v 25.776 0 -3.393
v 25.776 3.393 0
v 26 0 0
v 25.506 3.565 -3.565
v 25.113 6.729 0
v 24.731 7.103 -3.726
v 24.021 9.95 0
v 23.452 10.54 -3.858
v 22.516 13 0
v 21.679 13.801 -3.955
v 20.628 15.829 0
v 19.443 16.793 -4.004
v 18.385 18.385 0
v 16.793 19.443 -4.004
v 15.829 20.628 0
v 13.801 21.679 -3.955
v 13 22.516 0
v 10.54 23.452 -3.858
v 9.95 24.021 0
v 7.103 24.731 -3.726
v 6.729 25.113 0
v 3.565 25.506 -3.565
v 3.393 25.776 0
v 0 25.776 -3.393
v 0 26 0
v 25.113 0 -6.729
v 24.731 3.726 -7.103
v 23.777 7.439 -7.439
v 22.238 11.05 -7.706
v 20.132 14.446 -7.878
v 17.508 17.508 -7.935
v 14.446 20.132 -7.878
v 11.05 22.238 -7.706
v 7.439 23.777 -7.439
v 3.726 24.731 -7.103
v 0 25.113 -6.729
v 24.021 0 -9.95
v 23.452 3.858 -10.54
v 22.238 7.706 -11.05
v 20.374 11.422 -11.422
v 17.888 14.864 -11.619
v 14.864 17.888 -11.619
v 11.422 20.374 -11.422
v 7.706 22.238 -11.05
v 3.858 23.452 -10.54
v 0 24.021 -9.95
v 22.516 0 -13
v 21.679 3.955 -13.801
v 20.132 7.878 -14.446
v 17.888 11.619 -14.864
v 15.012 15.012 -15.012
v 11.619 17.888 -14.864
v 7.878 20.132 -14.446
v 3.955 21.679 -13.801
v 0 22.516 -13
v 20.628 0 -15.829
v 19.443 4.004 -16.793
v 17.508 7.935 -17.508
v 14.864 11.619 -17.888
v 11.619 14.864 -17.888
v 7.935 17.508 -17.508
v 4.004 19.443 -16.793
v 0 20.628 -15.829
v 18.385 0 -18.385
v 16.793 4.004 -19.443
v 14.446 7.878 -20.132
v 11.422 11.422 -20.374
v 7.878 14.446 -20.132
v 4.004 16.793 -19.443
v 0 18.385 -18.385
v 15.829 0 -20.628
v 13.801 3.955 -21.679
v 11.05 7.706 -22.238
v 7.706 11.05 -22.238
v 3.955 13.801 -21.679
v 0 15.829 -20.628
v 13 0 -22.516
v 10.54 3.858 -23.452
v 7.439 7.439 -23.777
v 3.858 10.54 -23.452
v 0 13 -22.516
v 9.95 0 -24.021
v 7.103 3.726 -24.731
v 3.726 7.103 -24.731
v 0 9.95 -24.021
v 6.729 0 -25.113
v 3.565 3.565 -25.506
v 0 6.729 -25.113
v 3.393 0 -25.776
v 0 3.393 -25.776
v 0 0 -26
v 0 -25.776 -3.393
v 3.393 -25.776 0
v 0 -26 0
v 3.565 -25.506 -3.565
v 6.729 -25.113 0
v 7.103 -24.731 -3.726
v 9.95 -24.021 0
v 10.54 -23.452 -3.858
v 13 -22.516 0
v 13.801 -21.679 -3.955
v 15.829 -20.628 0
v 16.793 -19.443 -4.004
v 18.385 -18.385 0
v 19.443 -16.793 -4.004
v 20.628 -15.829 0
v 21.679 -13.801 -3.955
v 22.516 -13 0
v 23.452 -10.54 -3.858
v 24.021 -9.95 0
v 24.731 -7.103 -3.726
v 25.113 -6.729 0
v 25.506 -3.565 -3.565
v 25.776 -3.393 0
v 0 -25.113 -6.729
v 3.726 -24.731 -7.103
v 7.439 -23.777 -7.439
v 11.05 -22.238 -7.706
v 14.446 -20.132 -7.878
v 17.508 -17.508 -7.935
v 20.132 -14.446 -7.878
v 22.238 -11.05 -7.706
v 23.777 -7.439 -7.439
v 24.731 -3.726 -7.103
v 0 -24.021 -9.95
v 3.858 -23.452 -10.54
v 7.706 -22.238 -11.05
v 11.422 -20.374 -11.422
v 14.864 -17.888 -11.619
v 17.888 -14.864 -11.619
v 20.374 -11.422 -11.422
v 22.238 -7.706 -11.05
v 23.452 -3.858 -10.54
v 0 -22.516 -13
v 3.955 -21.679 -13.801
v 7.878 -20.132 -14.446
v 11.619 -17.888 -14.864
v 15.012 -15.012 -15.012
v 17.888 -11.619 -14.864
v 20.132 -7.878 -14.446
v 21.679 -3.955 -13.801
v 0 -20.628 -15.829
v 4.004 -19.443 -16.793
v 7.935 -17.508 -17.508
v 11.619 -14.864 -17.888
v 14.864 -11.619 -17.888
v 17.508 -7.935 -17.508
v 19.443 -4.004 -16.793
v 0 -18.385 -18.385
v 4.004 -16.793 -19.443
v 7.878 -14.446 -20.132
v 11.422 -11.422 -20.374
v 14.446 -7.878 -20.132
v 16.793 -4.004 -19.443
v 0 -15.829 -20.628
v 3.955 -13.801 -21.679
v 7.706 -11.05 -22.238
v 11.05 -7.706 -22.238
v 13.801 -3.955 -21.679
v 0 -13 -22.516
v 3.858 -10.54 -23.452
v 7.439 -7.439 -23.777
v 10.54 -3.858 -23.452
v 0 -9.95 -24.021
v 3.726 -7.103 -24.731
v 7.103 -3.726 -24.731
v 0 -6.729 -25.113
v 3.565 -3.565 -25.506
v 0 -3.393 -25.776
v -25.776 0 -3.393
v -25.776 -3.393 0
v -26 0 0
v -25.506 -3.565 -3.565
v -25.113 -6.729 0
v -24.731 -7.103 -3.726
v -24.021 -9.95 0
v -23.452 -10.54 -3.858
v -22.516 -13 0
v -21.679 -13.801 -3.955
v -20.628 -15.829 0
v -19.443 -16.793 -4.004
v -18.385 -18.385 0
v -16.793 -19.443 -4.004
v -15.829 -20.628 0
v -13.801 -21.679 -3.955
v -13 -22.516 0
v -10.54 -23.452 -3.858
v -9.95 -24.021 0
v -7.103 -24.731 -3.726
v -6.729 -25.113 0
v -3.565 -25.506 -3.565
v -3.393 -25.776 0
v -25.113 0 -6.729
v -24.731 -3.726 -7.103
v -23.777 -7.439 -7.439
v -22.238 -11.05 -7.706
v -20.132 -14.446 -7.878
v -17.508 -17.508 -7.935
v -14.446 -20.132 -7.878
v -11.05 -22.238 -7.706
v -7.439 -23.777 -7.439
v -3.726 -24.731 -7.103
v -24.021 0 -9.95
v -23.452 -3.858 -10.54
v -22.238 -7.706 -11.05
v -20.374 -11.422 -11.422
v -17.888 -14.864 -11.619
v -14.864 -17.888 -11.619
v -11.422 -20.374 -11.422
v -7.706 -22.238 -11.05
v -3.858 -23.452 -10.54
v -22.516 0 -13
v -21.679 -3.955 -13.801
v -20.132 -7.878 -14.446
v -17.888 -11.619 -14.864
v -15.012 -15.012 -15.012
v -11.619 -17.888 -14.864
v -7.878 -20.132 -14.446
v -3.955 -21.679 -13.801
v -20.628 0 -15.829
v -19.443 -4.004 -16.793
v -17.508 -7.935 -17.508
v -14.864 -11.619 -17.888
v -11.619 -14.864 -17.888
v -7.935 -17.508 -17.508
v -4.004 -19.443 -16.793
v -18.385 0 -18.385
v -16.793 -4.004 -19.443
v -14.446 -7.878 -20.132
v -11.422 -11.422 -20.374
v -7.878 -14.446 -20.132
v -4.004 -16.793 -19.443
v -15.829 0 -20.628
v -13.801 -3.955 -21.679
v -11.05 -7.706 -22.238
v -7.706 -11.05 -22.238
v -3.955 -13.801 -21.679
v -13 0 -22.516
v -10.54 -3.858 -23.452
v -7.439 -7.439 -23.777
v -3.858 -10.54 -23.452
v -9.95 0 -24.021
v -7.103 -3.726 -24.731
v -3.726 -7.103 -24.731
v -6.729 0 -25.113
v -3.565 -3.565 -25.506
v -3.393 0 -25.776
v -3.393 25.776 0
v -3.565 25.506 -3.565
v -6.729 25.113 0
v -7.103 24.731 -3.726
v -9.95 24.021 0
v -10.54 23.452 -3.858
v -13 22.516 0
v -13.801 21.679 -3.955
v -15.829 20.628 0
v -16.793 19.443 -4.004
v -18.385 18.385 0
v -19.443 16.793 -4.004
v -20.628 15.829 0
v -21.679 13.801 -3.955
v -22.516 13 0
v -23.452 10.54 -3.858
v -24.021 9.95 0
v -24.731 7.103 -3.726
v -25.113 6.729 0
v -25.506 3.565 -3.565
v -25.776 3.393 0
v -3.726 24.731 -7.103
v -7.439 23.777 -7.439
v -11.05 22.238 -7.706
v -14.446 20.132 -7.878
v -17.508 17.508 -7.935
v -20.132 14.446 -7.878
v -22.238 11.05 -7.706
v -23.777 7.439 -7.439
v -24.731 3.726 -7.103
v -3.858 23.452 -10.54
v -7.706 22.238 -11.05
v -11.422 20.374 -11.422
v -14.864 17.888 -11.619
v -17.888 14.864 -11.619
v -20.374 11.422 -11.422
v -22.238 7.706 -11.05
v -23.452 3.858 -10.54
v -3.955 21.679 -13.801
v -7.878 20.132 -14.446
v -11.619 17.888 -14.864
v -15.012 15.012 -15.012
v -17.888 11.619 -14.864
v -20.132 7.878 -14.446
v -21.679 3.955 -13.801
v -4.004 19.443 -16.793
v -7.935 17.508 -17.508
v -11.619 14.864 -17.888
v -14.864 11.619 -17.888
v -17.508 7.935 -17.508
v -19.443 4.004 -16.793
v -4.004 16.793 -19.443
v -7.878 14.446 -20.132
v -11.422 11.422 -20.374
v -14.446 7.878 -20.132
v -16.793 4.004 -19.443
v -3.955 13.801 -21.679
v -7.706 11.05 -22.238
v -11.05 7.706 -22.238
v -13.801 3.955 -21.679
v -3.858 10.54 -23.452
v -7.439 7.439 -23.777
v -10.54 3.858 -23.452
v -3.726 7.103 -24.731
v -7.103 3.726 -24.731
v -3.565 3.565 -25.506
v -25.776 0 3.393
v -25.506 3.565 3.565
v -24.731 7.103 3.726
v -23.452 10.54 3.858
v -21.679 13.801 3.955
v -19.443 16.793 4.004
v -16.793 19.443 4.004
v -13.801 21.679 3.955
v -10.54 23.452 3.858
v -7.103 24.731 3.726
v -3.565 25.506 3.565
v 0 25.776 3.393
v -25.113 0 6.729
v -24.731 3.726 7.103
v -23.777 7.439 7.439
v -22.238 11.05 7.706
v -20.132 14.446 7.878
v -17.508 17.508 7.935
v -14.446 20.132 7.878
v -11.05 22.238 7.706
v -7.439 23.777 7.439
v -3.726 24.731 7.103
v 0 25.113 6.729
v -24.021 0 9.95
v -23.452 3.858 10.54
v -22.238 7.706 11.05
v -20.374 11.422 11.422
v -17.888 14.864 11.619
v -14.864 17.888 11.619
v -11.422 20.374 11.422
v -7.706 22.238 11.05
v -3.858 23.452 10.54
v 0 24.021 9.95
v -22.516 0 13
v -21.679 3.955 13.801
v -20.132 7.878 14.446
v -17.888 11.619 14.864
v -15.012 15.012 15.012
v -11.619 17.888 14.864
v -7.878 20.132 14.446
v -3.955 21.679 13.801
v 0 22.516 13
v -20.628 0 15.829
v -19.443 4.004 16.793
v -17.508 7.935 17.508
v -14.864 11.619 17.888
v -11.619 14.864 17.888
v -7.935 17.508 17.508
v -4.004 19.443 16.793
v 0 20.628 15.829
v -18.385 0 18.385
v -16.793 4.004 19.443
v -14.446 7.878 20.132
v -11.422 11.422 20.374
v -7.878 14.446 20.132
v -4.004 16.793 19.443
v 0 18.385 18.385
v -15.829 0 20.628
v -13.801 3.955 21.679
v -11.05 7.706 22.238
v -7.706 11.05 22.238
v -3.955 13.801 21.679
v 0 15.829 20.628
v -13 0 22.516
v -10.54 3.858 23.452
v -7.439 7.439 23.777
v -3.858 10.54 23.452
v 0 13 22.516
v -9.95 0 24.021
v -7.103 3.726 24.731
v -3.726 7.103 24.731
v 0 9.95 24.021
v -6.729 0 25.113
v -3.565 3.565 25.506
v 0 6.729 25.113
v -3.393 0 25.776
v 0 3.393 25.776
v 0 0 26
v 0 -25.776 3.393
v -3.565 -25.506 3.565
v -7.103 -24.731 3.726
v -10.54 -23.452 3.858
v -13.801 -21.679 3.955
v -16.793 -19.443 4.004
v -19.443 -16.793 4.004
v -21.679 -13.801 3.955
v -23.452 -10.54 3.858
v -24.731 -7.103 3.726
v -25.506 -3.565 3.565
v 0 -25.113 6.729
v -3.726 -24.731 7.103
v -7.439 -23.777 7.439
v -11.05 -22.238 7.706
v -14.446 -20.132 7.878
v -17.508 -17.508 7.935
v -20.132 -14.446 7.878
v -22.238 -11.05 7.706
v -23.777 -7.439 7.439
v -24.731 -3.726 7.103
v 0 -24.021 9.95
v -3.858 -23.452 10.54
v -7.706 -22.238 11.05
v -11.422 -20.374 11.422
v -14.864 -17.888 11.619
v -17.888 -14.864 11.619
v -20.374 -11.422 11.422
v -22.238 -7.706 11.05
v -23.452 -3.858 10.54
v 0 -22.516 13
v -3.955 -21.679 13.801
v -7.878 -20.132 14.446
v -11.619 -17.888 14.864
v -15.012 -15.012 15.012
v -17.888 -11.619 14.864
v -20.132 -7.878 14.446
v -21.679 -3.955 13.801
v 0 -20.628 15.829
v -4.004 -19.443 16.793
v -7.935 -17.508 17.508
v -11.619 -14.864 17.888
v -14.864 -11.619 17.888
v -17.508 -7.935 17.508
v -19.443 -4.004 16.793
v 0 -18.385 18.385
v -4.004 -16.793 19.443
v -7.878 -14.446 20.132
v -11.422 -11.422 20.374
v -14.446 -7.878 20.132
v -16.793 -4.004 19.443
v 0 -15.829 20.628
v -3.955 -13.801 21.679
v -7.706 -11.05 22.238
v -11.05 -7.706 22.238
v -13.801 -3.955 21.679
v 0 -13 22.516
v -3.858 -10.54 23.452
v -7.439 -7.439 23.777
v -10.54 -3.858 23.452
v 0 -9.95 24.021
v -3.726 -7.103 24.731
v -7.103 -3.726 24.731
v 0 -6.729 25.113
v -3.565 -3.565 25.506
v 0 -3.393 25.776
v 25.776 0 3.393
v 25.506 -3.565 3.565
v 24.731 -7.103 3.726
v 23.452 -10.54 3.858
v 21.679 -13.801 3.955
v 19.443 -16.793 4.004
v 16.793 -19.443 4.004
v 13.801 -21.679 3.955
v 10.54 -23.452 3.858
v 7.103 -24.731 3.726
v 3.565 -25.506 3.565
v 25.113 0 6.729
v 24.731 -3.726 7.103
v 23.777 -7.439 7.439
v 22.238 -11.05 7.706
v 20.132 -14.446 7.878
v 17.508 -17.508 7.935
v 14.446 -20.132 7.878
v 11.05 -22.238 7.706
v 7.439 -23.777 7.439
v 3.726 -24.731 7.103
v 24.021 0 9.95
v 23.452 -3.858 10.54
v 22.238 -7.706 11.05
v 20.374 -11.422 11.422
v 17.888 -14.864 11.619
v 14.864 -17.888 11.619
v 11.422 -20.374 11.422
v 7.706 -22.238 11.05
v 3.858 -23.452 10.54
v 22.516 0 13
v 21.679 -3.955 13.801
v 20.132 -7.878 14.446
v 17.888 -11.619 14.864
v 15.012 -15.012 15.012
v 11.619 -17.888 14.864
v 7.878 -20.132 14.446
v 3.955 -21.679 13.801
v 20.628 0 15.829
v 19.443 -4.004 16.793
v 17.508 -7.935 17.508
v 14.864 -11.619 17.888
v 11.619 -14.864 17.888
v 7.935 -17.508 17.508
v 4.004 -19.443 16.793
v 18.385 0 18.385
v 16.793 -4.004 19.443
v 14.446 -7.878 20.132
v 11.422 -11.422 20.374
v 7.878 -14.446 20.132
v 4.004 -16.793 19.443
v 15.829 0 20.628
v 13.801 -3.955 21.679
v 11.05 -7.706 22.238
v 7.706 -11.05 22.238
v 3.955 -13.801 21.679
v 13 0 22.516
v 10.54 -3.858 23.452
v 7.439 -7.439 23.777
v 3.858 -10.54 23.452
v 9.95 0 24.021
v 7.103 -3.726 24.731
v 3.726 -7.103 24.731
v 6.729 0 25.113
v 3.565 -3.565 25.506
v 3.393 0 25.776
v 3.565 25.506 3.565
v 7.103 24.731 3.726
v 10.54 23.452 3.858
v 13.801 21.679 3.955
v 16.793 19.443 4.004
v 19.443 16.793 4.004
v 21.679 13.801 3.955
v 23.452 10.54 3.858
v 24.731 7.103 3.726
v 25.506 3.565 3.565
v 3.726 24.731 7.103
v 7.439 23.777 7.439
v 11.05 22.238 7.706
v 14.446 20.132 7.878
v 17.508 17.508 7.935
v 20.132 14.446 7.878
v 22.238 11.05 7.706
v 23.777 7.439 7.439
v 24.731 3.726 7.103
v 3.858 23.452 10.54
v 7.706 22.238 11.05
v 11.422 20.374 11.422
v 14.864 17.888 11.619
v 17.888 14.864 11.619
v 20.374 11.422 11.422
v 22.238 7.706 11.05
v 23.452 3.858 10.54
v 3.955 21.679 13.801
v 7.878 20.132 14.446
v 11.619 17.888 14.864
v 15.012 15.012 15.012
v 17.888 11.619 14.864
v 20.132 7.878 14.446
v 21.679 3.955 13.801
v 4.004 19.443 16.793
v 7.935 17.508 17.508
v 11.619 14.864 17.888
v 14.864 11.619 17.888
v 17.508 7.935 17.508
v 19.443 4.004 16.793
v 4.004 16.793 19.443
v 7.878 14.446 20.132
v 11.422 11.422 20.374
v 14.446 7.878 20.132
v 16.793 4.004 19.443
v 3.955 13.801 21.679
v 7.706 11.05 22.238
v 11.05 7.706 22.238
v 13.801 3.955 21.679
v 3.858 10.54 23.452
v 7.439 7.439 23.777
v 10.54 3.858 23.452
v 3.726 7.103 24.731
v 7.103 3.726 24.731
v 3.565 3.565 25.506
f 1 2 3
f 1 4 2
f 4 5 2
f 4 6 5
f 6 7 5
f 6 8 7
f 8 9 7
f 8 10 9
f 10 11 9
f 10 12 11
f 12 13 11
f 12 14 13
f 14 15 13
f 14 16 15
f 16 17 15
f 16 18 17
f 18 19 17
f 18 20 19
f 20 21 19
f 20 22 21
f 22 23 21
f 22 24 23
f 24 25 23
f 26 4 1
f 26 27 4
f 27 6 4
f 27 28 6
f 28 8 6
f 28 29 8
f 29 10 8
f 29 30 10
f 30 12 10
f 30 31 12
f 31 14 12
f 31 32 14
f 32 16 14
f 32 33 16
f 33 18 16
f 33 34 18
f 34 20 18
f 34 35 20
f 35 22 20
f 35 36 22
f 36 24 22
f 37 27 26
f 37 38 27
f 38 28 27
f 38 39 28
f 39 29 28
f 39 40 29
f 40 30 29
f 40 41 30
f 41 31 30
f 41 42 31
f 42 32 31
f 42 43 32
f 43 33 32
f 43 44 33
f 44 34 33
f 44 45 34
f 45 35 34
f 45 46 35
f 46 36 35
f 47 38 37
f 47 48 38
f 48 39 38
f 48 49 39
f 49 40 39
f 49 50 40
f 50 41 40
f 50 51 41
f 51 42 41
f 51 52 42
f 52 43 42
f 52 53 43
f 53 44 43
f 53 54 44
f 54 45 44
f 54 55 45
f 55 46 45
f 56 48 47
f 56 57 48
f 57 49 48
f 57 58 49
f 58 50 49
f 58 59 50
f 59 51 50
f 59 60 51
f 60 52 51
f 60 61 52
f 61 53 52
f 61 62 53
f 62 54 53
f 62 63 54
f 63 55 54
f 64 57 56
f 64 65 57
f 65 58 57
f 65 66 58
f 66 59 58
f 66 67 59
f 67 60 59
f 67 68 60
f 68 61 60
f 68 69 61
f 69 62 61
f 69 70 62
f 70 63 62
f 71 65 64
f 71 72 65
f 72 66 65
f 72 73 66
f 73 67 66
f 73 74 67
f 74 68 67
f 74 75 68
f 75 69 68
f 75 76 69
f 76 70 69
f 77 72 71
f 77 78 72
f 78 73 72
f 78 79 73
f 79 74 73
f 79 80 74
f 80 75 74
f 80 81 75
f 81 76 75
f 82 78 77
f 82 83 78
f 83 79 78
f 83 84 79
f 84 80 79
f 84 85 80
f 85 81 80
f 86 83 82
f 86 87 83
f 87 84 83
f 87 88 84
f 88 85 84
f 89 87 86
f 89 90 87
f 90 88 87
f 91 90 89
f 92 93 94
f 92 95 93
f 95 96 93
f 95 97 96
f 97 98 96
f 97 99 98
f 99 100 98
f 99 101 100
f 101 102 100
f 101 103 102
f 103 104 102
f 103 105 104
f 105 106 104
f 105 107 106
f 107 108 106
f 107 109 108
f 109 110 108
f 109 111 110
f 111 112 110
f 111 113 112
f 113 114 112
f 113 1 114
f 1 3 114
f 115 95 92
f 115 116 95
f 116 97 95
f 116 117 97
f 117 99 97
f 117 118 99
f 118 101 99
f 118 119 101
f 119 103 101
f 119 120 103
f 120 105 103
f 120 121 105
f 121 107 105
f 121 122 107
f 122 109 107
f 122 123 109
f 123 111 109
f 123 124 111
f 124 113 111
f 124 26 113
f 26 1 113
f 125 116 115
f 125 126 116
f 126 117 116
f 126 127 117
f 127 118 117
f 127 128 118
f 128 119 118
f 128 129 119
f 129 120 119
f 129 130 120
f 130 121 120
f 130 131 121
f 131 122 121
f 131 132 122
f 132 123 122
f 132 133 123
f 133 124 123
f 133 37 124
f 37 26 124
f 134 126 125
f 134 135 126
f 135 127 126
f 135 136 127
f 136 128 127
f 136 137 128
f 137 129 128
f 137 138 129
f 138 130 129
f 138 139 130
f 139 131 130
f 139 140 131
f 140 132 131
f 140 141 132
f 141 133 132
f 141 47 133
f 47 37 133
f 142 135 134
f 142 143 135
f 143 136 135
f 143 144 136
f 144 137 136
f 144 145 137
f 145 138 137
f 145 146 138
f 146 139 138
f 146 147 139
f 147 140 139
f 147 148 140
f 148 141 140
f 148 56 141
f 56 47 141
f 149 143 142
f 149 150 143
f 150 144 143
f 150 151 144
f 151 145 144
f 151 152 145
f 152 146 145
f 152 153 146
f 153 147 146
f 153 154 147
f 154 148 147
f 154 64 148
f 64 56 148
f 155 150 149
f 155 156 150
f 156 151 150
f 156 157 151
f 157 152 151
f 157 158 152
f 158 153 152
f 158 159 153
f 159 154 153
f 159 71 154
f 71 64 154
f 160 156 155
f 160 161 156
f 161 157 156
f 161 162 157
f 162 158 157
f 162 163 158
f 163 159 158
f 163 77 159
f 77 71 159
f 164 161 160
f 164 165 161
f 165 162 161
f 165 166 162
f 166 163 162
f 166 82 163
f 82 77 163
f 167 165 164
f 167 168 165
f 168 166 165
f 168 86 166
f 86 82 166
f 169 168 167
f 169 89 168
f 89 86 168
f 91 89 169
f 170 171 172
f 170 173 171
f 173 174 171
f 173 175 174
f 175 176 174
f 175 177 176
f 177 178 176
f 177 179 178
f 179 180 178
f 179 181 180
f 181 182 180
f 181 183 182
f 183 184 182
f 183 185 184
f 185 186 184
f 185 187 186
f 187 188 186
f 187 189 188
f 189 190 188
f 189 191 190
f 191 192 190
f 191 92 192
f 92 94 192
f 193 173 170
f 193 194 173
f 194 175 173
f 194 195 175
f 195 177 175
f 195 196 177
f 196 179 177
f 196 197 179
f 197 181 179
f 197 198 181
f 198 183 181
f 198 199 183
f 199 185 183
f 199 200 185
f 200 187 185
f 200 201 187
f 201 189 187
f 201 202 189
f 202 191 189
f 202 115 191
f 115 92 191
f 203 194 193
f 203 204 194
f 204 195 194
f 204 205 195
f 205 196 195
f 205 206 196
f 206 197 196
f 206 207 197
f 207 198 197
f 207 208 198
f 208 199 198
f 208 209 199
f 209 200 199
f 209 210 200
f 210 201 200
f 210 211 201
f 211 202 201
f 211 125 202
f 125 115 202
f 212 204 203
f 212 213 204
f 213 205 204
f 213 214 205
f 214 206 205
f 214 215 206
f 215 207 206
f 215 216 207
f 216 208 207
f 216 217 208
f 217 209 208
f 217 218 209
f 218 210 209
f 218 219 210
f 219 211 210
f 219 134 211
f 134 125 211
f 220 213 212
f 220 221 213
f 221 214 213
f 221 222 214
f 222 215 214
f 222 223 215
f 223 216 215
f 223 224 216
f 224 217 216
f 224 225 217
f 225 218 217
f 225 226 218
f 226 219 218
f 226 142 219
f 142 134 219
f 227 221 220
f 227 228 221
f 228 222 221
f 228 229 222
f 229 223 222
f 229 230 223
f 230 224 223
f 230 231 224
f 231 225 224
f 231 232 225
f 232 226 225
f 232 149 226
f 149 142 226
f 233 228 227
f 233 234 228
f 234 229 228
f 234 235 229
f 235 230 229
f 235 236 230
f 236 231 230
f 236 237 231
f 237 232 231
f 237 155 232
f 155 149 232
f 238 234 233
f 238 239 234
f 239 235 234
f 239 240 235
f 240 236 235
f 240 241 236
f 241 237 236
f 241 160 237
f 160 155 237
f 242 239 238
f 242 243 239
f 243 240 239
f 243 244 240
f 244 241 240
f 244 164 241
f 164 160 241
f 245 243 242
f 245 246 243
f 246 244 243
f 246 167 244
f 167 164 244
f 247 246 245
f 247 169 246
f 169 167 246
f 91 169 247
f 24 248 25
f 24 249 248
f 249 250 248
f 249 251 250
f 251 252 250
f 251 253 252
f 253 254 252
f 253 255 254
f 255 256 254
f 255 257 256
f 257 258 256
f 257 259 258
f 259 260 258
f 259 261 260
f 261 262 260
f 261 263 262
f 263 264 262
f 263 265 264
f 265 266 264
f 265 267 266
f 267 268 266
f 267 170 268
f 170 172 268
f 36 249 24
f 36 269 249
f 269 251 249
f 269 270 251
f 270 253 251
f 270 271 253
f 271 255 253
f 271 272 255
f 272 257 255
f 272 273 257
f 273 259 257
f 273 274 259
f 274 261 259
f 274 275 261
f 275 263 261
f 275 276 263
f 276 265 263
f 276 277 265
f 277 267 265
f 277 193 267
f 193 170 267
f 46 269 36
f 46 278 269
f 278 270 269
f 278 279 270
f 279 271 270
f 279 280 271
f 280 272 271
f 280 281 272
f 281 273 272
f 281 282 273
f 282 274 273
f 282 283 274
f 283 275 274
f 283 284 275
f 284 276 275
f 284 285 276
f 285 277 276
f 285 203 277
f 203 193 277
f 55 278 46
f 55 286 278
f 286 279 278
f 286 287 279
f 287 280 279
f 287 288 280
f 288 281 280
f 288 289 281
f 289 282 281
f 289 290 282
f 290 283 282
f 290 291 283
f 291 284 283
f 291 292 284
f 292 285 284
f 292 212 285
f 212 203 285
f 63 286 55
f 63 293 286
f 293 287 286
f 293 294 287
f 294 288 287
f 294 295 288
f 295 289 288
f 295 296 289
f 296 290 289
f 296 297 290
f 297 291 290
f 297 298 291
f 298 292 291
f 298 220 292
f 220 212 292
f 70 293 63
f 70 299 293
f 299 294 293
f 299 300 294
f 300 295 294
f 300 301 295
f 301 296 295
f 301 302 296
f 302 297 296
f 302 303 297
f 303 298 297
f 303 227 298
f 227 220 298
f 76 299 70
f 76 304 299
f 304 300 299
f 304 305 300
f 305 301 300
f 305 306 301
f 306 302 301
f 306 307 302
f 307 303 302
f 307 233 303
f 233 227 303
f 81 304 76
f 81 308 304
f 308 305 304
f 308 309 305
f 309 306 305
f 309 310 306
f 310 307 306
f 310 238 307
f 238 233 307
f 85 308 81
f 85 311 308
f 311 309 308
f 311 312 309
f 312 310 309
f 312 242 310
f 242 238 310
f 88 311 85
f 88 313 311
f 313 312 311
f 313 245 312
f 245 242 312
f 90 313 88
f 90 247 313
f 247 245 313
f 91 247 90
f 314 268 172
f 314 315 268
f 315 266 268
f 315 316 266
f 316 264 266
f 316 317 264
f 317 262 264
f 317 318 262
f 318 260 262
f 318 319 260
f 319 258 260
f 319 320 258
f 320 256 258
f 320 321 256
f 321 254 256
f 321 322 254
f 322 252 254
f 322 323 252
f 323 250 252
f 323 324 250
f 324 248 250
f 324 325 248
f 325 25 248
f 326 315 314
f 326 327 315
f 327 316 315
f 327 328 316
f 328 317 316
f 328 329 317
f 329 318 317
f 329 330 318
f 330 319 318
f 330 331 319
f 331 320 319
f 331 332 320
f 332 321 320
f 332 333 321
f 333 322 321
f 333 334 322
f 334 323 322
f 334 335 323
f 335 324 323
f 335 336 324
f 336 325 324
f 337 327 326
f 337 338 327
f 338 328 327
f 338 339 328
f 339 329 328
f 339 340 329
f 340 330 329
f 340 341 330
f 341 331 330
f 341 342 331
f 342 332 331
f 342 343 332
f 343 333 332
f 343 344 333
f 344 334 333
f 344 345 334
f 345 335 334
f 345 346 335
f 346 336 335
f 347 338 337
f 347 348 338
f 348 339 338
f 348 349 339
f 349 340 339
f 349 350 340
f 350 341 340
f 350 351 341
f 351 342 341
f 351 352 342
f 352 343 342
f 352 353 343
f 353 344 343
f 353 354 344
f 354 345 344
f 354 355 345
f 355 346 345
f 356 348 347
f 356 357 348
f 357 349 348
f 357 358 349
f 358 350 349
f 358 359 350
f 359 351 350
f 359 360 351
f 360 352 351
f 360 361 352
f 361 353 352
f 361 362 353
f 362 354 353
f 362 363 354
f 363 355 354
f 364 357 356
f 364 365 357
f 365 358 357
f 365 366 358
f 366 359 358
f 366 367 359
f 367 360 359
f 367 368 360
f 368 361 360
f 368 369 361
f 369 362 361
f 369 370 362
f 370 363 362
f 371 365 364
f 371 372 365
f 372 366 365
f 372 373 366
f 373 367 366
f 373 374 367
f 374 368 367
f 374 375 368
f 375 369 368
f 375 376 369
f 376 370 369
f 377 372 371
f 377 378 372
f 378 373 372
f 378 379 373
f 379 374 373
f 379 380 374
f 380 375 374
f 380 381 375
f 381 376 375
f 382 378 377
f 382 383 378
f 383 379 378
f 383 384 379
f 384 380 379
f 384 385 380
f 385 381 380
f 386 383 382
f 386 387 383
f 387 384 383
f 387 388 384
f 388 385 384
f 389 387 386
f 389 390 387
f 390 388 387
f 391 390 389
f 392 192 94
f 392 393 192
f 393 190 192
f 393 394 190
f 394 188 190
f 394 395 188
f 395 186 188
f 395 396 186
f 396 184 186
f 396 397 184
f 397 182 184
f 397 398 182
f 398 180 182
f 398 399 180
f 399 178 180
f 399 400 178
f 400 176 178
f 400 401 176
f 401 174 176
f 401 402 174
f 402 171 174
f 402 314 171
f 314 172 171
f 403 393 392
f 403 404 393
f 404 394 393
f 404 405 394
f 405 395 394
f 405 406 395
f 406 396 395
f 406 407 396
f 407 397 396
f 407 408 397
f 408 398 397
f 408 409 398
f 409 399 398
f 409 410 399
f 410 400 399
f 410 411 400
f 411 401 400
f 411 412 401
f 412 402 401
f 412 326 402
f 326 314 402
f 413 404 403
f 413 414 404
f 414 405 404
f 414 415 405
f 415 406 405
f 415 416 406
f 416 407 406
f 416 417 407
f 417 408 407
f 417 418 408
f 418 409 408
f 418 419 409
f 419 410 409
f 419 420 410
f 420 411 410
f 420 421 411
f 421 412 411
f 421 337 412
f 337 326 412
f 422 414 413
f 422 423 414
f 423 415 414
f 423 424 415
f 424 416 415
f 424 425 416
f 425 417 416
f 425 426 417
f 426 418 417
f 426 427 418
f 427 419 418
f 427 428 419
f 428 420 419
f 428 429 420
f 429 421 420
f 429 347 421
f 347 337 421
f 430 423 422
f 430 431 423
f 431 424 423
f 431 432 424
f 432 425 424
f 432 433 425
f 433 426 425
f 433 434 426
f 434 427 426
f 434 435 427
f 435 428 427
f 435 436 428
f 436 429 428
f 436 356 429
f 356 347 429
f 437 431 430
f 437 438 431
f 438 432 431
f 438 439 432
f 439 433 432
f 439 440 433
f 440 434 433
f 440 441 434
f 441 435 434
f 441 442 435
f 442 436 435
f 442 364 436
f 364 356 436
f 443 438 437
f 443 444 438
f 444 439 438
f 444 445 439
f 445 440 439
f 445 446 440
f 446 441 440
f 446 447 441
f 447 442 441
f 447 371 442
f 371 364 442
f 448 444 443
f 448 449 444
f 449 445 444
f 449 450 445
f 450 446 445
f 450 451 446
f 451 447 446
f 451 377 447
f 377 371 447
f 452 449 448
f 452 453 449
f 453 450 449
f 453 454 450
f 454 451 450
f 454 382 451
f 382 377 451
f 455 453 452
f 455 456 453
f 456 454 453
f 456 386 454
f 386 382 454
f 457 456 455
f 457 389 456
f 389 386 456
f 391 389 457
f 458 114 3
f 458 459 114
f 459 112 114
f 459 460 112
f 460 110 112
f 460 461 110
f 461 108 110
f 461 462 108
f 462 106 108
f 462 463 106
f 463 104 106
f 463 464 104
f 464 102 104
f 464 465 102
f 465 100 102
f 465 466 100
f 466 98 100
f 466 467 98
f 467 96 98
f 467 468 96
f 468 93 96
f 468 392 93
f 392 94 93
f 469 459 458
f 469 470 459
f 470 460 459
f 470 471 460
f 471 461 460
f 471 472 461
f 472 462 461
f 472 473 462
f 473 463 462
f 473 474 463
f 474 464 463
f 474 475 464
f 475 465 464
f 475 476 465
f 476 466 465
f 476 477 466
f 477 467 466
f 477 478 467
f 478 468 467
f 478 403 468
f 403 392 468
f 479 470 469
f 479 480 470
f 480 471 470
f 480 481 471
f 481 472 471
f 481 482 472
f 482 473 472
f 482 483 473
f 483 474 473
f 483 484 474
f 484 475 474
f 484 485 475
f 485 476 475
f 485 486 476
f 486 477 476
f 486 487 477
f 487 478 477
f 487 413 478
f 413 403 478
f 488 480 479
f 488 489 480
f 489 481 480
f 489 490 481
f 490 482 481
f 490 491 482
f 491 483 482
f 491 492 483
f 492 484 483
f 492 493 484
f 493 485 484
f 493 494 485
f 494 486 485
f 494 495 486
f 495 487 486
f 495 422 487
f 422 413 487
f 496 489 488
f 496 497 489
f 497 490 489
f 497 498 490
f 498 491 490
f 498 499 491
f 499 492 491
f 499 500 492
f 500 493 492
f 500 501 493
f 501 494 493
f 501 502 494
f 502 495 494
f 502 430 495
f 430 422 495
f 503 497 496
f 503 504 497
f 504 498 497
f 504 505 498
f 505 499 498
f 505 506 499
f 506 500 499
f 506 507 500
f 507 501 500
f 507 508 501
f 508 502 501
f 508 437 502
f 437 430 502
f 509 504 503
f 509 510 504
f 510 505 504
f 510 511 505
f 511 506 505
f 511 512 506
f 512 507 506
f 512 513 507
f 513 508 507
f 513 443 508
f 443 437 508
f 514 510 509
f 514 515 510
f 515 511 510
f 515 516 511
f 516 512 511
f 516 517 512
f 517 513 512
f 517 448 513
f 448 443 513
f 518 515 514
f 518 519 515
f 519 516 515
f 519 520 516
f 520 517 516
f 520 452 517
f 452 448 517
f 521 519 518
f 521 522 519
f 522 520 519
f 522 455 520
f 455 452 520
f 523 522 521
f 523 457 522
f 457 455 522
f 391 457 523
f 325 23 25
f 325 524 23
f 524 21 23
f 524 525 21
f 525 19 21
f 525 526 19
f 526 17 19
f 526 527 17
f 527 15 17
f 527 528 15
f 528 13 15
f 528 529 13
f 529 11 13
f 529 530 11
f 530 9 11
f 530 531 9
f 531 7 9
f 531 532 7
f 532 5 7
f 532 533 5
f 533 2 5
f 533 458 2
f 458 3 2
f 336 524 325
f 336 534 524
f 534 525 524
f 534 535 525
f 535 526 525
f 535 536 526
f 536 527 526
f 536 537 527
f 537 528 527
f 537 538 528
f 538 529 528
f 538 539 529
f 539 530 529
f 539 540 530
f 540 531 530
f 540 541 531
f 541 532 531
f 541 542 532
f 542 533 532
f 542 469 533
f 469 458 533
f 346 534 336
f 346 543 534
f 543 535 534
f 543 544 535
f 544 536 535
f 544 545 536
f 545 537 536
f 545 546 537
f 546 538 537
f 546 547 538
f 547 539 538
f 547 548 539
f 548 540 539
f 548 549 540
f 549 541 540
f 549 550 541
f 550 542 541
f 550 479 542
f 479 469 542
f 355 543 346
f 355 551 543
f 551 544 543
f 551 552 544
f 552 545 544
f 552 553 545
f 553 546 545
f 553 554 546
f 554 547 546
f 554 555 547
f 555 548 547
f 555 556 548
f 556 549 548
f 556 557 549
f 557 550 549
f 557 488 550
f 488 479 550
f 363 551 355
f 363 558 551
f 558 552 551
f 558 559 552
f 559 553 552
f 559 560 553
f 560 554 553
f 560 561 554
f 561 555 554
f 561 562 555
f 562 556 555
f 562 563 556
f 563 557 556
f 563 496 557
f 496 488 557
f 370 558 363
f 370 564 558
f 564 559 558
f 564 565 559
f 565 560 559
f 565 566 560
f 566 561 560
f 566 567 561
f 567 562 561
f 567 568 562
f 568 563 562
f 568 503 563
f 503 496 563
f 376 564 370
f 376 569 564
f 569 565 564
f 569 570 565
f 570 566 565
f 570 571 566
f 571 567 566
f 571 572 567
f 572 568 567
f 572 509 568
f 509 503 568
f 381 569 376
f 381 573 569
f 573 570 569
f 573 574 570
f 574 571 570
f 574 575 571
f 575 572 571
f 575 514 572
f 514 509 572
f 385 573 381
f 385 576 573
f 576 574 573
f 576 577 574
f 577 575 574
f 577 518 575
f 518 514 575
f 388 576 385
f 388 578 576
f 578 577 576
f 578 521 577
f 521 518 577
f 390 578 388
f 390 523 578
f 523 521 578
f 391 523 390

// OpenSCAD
// file: ../p/48/8-8sphe.scad
use <../../lib.scad>
use <1-8sphe.scad>
function ldraw_lib__48__8_8sphe() = [
// 0 Hi-Res Sphere 1.0
// 0 Name: 48\8-8sphe.dat
// 0 Author: Steve Bliss [sbliss]
// 0 !LDRAW_ORG 48_Primitive UPDATE 2012-01
// 0 !LICENSE Licensed under CC BY 2.0 and CC BY 4.0 : see CAreadme.txt
// 
// 0 BFC CERTIFY CCW
  [0,"BFC","CERTIFY"],
  [0,"BFC","CCW"],
// 
// 0 !HISTORY 2012-03-30 [PTadmin] Official Update 2012-01
// 
// 
// 1 16 0 0 0 1 0 0 0 1 0 0 0 1 48\1-8sphe.dat
  [1,16,0,0,0,1,0,0,0,1,0,0,0,1, ldraw_lib__48__1_8sphe()],
// 1 16 0 0 0 0 0 1 0 1 0 -1 0 0 48\1-8sphe.dat
  [1,16,0,0,0,0,0,1,0,1,0,-1,0,0, ldraw_lib__48__1_8sphe()],
// 1 16 0 0 0 -1 0 0 0 1 0 0 0 -1 48\1-8sphe.dat
  [1,16,0,0,0,-1,0,0,0,1,0,0,0,-1, ldraw_lib__48__1_8sphe()],
// 1 16 0 0 0 0 0 -1 0 1 0 1 0 0 48\1-8sphe.dat
  [1,16,0,0,0,0,0,-1,0,1,0,1,0,0, ldraw_lib__48__1_8sphe()],
// 1 16 0 0 0 -1 0 0 0 -1 0 0 0 1 48\1-8sphe.dat
  [1,16,0,0,0,-1,0,0,0,-1,0,0,0,1, ldraw_lib__48__1_8sphe()],
// 1 16 0 0 0 0 0 -1 0 -1 0 -1 0 0 48\1-8sphe.dat
  [1,16,0,0,0,0,0,-1,0,-1,0,-1,0,0, ldraw_lib__48__1_8sphe()],
// 1 16 0 0 0 1 0 0 0 -1 0 0 0 -1 48\1-8sphe.dat
  [1,16,0,0,0,1,0,0,0,-1,0,0,0,-1, ldraw_lib__48__1_8sphe()],
// 1 16 0 0 0 0 0 1 0 -1 0 1 0 0 48\1-8sphe.dat
  [1,16,0,0,0,0,0,1,0,-1,0,1,0,0, ldraw_lib__48__1_8sphe()],
// 0
];
makepoly(ldraw_lib__48__8_8sphe(), line=0.2);
// file: 22119.scad
use <../lib.scad>
use <../p/48/8-8sphe.scad>
function ldraw_lib__22119() = [
// 0 Ball 52mm Diameter
// 0 Name: 22119.dat
// 0 Author: Philippe Hurbain [Philo]
// 0 !LDRAW_ORG Part UPDATE 2012-01
// 0 !LICENSE Licensed under CC BY 2.0 and CC BY 4.0 : see CAreadme.txt
// 
// 0 BFC CERTIFY CCW
  [0,"BFC","CERTIFY"],
  [0,"BFC","CCW"],
// 
// 0 !CATEGORY Sphere
// 
// 0 !HISTORY 2012-03-30 [PTadmin] Official Update 2012-01
// 
// 
// 1 16 0 0 0 65 0 0 0 65 0 0 0 65 48\8-8sphe.dat
  [1,16,0,0,0,65,0,0,0,65,0,0,0,65, ldraw_lib__48__8_8sphe()],
// 0
];
makepoly(ldraw_lib__22119(), line=0.2);
// main file
use <../lib.scad>
use <22119.scad>
function ldraw_lib__71368() = [
// 0 ~_Ball 52mm Diameter Blue (Obsolete)
// 0 Name: 71368.dat
// 0 Author: [PTadmin]
// 0 !LDRAW_ORG Part Physical_Colour UPDATE 2019-03
// 0 !LICENSE Licensed under CC BY 2.0 and CC BY 4.0 : see CAreadme.txt
// 
// 0 BFC CERTIFY CW
  [0,"BFC","CERTIFY"],
  [0,"BFC","CW"],
// 
// 0 !CATEGORY Sphere
// 
// 0 !HISTORY 2012-03-30 [PTadmin] Official Update 2012-01
// 0 !HISTORY 2019-09-09 [Steffen] obsoleted per decision not to include physical colour parts
// 0 !HISTORY 2019-12-27 [PTadmin] Official Update 2019-03
// 
// 
// 0 // This file is a "shortcut" with the correct number for the actual
// 0 // colouring of the part (Blue).
// 
// 1 1 0 0 0 1 0 0 0 1 0 0 0 1 22119.dat
  [1,1,0,0,0,1,0,0,0,1,0,0,0,1, ldraw_lib__22119()],
];
makepoly(ldraw_lib__71368(), line=0.2);
